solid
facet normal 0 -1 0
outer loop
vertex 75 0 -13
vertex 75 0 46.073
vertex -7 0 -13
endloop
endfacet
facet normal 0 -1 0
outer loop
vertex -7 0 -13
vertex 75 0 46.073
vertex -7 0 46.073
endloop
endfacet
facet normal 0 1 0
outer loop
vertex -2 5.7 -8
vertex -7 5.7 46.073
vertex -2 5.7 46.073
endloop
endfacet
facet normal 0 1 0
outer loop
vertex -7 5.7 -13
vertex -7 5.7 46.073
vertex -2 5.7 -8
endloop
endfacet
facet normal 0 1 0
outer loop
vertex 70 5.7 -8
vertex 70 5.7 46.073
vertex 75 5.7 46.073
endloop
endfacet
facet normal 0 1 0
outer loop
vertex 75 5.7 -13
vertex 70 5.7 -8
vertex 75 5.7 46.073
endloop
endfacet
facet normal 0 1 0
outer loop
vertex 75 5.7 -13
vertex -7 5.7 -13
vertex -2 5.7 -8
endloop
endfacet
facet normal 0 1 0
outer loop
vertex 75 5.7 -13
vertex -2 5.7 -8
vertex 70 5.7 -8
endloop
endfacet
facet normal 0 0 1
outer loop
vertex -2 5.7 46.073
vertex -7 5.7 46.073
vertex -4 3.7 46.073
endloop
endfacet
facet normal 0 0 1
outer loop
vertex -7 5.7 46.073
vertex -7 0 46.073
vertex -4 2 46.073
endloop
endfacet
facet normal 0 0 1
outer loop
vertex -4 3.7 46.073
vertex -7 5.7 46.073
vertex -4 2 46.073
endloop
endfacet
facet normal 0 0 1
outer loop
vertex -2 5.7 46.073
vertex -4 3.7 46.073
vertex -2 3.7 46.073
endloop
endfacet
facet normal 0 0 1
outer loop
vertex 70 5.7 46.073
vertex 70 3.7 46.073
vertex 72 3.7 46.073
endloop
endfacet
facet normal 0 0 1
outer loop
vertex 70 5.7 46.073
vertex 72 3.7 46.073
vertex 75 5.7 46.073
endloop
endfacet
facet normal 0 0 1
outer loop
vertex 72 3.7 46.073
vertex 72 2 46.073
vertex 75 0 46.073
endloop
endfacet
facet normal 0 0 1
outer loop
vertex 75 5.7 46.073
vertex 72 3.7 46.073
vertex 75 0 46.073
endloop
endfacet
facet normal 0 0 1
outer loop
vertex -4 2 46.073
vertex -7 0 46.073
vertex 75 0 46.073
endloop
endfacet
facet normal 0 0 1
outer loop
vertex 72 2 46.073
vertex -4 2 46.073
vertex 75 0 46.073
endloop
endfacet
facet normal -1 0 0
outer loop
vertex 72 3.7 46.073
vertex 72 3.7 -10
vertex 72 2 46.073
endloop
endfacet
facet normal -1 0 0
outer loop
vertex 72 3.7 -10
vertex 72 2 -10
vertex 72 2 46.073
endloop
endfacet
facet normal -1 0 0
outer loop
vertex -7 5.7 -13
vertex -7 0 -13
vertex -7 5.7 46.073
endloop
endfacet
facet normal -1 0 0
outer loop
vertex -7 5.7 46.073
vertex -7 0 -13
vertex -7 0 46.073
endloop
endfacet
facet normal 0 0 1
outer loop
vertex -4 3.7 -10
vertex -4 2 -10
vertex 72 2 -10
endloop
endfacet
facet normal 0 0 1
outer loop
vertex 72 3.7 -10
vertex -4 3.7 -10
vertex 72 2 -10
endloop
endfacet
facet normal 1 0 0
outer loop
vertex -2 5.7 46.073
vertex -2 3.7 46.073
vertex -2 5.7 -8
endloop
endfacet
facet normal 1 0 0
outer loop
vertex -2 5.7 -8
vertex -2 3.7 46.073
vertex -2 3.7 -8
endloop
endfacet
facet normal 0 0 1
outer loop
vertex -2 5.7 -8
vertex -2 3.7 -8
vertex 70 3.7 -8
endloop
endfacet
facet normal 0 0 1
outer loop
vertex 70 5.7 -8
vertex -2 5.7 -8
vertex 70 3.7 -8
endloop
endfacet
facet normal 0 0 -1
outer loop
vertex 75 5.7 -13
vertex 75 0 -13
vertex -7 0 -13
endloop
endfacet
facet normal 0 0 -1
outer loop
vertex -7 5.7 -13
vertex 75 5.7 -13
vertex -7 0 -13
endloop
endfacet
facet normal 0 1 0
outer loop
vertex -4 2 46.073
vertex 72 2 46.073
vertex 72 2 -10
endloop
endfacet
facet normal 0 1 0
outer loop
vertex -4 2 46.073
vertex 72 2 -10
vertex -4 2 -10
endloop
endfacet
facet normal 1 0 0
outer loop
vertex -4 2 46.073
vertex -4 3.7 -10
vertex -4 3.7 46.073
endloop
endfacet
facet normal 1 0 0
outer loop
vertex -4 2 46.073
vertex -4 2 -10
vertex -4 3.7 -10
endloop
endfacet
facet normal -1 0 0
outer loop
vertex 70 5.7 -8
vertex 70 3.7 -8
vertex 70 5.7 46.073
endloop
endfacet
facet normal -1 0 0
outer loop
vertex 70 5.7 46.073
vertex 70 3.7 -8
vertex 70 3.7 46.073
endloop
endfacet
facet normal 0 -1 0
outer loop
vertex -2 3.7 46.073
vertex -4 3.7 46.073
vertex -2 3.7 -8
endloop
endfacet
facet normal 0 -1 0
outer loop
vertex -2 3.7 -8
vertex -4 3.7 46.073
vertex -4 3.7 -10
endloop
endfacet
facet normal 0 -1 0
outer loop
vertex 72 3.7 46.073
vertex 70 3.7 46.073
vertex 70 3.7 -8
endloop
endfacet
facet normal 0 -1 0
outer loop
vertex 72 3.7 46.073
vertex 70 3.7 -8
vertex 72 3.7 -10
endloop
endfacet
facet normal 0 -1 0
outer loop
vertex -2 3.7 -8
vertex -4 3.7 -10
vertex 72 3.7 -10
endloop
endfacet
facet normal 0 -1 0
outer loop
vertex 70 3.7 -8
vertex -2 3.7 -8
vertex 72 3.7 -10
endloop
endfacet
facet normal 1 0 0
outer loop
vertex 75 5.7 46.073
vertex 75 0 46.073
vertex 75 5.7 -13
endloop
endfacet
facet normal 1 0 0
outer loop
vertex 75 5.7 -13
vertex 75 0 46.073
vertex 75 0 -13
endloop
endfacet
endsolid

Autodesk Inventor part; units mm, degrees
ref_plane "YZ Plane" through (0, 0, 0) normal (1, 0, 0) x (0, 1, 0)
ref_plane "XZ Plane" through (0, 0, 0) normal (0, 1, 0) x (-1, 0, 0)
ref_plane "XY Plane" through (0, 0, 0) normal (0, 0, 1) x (1, 0, 0)
sketch "Szkic1" plane through (0, 0, 0) normal (0, 1, 0) x (-1, 0, 0)
  line L0 (7, 46.073) -> (-75, 46.073)
  line L1 (-75, 46.073) -> (-75, -13)
  line L2 (-75, -13) -> (7, -13)
  line L3 (7, -13) -> (7, 46.073)
  point P0 (0, 0)
  dimension "d0" = 82
  dimension "d1" = 59.073
extrude "Wyciągnięcie proste1" add sketch "Szkic1" along normal blind 2
sketch "Szkic2" plane through (0, 2, 0) normal (0, 1, 0) x (1, 0, 0)
  line L0 (75, -46.073) -> (75, 13) projected
  line L1 (75, 13) -> (-7, 13) projected
  line L2 (-7, 13) -> (-7, -46.073) projected
  line L3 (-7, -46.073) -> (75, -46.073) projected
  line L4 (-4, 10) -> (72, 10)
  line L5 (72, 10) -> (72, -43.073)
  line L6 (72, -43.073) -> (-4, -43.073)
  line L7 (-4, -43.073) -> (-4, 10)
  line L8 (-4, -43.073) -> (-4, -46.073)
  line L9 (72, -43.073) -> (72, -46.073)
  line L10 (-7, -46.073) -> (75, -46.073) projected
  point P0 (0, 0)
  dimension "d4" = 3
extrude "Wyciągnięcie proste2" add sketch "Szkic2" along normal blind 1.7 contours L3 L9 L5 L4 L7 L8 L2 L1 L0
sketch "Szkic3" plane through (0, 3.7, 0) normal (0, 1, 0) x (1, 0, 0)
  line L0 (75, 13) -> (-7, 13) projected
  line L1 (-7, 13) -> (-7, -46.073) projected
  line L2 (-7, -46.073) -> (-4, -46.073) projected
  line L3 (72, -46.073) -> (75, -46.073) projected
  line L4 (75, -46.073) -> (75, 13) projected
  line L5 (72, -46.073) -> (72, 10) projected
  line L6 (72, 10) -> (-4, 10) projected
  line L7 (-4, 10) -> (-4, -46.073) projected
  line L8 (-4, -46.073) -> (72, -46.073) projected
  line L9 (-2, 8) -> (70, 8)
  line L10 (70, 8) -> (70, -44.073)
  line L11 (70, -44.073) -> (-2, -44.073)
  line L12 (-2, -44.073) -> (-2, 8)
  line L13 (-2, -44.073) -> (-2, -46.073)
  line L14 (-7, -46.073) -> (75, -46.073) projected
  line L15 (70, -44.073) -> (70, -46.073)
  point P0 (0, 0)
  dimension "d7" = 2
extrude "Wyciągnięcie proste3" add sketch "Szkic3" along normal blind 2 contours L4 L3 L5 L6 L7 L2 L1 L0 | L8 L15 L10 L9 L12 L13 L7 L6 L5
properties part number "podstawka_na_pcb"
